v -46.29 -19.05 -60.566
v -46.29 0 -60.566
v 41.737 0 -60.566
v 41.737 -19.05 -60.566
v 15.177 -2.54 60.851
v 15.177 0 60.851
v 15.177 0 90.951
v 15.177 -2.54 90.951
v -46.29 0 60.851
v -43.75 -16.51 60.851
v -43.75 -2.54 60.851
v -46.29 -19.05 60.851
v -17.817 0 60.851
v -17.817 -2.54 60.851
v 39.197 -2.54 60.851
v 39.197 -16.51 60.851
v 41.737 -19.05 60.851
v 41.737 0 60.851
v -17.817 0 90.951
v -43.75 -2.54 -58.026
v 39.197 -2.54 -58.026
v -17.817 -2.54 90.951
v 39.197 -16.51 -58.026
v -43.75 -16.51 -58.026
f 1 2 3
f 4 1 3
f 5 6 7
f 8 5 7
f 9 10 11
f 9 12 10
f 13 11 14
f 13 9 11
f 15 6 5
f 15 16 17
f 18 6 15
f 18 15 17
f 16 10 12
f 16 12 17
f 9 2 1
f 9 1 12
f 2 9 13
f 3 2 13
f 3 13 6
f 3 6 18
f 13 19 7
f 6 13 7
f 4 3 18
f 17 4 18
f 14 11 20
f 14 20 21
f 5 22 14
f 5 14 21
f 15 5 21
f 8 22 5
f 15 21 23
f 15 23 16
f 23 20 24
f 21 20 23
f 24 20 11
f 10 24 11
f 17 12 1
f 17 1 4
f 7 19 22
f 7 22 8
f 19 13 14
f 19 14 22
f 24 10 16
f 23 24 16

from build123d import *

# Parameters (mm, degrees)
F0_W     = 88.027496
F0_H     = 121.417232
F1_DEPTH = 19.05
F2_T     = -2.54
F3_W     = 32.993815
F3_H     = 30.100085
F4_DEPTH = 2.54


with BuildPart() as f1:
    # F0 (on Front) → F1 (new body)
    with BuildSketch(Plane.XZ):
        with Locations((-2.276575, 0.142578)):
            Rectangle(F0_W, F0_H)
    extrude(amount=F1_DEPTH)

    # F2
    f2_openings = [f1.faces().sort_by_distance(p)[0] for p in [
        (-2.276575, -9.525, 60.851194),
    ]]
    offset(amount=F2_T, openings=f2_openings)

    # F3 (on face) → F4 (join)
    with BuildSketch(Plane.XZ):
        with Locations((-1.319751, 75.901236)):
            Rectangle(F3_W, F3_H)
    extrude(amount=F4_DEPTH)


solid = f1.part
